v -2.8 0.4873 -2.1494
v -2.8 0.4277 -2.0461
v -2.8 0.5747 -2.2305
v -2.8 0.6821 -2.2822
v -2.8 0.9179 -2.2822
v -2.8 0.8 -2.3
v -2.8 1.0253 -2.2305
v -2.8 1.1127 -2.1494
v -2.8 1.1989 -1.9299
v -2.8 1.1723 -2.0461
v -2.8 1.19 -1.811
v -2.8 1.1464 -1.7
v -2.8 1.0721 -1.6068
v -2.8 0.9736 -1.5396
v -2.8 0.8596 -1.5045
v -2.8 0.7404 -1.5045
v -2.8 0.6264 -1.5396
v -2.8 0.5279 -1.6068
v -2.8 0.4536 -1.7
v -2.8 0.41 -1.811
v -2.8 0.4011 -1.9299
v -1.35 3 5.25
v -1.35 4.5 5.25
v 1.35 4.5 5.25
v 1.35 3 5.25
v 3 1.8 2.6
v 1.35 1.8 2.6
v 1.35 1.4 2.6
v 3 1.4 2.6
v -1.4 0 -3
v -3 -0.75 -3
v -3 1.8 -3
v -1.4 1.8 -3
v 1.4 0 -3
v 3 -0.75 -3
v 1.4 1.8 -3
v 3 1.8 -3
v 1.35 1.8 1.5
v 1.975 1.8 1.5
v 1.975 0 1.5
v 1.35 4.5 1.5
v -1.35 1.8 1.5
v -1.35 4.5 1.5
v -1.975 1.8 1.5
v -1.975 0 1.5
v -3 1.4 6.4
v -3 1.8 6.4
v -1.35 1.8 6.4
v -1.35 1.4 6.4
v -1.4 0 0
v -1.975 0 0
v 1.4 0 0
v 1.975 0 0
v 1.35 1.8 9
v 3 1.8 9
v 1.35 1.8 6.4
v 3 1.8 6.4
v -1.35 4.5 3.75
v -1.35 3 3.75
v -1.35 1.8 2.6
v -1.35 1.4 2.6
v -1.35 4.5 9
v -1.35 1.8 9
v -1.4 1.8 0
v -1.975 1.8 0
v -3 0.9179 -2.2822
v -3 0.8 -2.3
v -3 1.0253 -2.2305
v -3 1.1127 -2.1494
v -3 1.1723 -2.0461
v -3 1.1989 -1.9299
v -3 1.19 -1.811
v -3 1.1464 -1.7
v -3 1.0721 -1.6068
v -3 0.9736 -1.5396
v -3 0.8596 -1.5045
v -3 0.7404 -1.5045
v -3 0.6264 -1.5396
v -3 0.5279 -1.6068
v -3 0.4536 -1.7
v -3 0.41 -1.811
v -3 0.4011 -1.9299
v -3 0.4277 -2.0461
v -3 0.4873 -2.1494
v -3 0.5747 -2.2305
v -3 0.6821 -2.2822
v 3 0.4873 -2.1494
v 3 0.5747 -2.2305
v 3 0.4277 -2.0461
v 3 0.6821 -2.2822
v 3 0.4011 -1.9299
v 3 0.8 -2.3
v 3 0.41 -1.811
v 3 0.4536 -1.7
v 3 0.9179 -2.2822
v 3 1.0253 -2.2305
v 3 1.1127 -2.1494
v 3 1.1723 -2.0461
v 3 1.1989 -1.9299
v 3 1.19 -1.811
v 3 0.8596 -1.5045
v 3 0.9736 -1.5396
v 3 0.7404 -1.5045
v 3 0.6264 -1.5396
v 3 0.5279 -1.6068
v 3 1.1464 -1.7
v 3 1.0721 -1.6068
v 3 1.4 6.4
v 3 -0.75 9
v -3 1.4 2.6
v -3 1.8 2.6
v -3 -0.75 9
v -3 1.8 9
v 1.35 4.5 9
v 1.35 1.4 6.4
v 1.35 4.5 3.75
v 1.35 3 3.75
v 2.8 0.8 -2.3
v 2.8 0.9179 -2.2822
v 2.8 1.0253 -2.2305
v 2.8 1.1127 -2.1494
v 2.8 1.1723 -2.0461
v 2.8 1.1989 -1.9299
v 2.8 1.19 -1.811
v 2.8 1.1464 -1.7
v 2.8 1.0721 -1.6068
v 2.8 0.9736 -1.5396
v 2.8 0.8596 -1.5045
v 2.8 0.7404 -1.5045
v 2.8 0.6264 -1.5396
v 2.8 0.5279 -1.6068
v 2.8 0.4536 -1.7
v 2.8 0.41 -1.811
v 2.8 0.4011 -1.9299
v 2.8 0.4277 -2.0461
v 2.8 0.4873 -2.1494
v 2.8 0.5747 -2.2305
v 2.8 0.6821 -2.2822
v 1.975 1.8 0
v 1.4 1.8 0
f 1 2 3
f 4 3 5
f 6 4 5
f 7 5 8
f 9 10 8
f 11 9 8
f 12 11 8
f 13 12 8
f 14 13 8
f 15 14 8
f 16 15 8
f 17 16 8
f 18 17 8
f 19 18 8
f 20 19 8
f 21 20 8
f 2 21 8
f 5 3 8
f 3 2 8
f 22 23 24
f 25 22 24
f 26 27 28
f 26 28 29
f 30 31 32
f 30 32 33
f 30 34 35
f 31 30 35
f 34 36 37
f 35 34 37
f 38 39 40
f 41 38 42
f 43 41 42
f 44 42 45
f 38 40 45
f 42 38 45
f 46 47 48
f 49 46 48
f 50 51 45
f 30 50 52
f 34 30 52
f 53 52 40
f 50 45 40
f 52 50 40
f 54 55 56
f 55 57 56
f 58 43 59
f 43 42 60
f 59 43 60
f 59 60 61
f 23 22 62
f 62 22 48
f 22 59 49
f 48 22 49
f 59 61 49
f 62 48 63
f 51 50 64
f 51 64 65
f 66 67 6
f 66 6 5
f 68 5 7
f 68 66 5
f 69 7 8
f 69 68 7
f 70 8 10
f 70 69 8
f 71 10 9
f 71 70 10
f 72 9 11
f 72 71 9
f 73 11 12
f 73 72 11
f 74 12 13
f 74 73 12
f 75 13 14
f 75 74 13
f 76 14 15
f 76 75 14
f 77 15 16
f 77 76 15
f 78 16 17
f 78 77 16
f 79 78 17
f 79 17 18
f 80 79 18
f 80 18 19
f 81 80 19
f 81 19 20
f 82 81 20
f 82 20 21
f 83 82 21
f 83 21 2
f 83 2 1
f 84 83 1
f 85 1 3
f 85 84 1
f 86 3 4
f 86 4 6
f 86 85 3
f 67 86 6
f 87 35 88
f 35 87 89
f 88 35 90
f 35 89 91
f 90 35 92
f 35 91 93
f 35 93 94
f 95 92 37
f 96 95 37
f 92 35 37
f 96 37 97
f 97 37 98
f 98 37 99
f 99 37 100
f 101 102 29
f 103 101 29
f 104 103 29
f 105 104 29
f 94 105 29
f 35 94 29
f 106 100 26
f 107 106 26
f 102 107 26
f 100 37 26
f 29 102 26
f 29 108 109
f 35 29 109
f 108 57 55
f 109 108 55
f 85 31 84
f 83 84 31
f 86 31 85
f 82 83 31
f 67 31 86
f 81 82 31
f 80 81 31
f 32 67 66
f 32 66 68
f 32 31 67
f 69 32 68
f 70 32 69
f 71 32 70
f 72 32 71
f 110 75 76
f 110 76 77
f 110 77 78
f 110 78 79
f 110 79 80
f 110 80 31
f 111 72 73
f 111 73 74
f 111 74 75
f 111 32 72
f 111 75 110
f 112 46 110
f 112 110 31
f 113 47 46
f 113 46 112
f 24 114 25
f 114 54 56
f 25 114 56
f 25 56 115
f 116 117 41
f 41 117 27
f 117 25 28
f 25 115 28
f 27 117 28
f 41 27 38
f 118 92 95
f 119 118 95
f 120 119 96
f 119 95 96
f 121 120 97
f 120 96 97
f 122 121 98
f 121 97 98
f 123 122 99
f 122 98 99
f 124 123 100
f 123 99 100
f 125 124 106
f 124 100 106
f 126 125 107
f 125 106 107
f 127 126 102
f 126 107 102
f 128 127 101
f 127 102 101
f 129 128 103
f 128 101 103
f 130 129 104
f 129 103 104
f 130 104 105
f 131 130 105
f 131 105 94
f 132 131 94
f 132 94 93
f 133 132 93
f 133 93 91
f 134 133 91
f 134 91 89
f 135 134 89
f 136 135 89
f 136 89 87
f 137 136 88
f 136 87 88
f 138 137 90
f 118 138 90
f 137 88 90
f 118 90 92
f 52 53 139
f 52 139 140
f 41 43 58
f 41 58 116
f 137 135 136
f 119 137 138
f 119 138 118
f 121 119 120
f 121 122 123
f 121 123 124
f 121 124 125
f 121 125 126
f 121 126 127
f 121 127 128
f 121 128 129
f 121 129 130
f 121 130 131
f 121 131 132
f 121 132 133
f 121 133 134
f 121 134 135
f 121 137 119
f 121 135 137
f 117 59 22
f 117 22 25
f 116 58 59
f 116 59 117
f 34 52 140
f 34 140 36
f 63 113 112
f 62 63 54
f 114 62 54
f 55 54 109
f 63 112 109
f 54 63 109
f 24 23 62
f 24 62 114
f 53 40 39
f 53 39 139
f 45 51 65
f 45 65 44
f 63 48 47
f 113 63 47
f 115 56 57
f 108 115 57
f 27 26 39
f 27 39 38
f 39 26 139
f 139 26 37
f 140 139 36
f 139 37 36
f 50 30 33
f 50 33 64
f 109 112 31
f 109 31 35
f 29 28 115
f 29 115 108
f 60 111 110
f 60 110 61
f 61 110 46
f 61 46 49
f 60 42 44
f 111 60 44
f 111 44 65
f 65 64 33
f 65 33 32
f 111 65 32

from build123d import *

# Parameters (mm, degrees)
BOSS_EXTRUDE1_DEPTH = 1.8
SKETCH2_W           = 6
SKETCH2_H           = 12
BOSS_EXTRUDE2_DEPTH = 0.75
SKETCH7_W           = 1.65
SKETCH7_H           = 3.8
CUT_EXTRUDE2_DEPTH  = 0.4
SKETCH9_R           = 0.4
CUT_EXTRUDE4_DEPTH  = 0.2
BOSS_EXTRUDE3_DEPTH = 2.7
SKETCH11_W          = 2.7
SKETCH11_H          = 1.5
CUT_EXTRUDE5_DEPTH  = 1.5


with BuildPart() as part:
    # Sketch1 → Boss-Extrude1 (new body)
    with BuildSketch(Plane(origin=(0, 0, 0), x_dir=(1, 0, 0), z_dir=(0, 1, 0))):
        Polygon((-1.4, 3), (-1.4, 0), (-1.975, 0), (-1.975, -1.5), (1.975, -1.5), (1.975, 0), (1.4, 0), (1.4, 3), (3, 3), (3, -9), (-3, -9), (-3, 3), align=None)
    extrude(amount=BOSS_EXTRUDE1_DEPTH)

    # Sketch2 → Boss-Extrude2 (add)
    with BuildSketch(Plane.XZ):
        with Locations((0, 3)):
            Rectangle(SKETCH2_W, SKETCH2_H)
    extrude(amount=BOSS_EXTRUDE2_DEPTH)

    # Sketch7 → Cut-Extrude2 (cut)
    with BuildSketch(Plane(origin=(0, 1.8, 0), x_dir=(1, 0, 0), z_dir=(0, 1, 0))):
        with Locations((-2.175, -4.5)):
            Rectangle(SKETCH7_W, SKETCH7_H)
        with Locations((2.175, -4.5)):
            Rectangle(SKETCH7_W, SKETCH7_H)
    extrude(amount=-CUT_EXTRUDE2_DEPTH, mode=Mode.SUBTRACT)

    # Sketch9 → Cut-Extrude4 (cut)
    with BuildSketch(Plane(origin=(3, 0, 0), x_dir=(0, 0, -1), z_dir=(1, 0, 0))):
        with Locations((1.9, 0.8)):
            Circle(SKETCH9_R)
    cut_extrude4 = extrude(amount=-CUT_EXTRUDE4_DEPTH, mode=Mode.SUBTRACT)

    # Mirror1: Cut-Extrude4 across plane
    add(cut_extrude4.mirror(Plane(origin=(0, 0, 0), x_dir=(0, 0, 1), z_dir=(1, 0, 0))), mode=Mode.SUBTRACT)

    # Sketch10 → Boss-Extrude3 (add)
    with BuildSketch(Plane(origin=(0, 1.8, 0), x_dir=(1, 0, 0), z_dir=(0, 1, 0))):
        Polygon((-1.35, -6.4), (-1.35, -9), (1.35, -9), (1.35, -6.4), (1.35, -2.6), (1.35, -1.5), (-1.35, -1.5), (-1.35, -2.6), align=None)
    extrude(amount=BOSS_EXTRUDE3_DEPTH)

    # Sketch11 → Cut-Extrude5 (cut)
    with BuildSketch(Plane(origin=(0, 4.5, 0), x_dir=(1, 0, 0), z_dir=(0, 1, 0))):
        with Locations((0, -4.5)):
            Rectangle(SKETCH11_W, SKETCH11_H)
    extrude(amount=-CUT_EXTRUDE5_DEPTH, mode=Mode.SUBTRACT)


solid = part.part
